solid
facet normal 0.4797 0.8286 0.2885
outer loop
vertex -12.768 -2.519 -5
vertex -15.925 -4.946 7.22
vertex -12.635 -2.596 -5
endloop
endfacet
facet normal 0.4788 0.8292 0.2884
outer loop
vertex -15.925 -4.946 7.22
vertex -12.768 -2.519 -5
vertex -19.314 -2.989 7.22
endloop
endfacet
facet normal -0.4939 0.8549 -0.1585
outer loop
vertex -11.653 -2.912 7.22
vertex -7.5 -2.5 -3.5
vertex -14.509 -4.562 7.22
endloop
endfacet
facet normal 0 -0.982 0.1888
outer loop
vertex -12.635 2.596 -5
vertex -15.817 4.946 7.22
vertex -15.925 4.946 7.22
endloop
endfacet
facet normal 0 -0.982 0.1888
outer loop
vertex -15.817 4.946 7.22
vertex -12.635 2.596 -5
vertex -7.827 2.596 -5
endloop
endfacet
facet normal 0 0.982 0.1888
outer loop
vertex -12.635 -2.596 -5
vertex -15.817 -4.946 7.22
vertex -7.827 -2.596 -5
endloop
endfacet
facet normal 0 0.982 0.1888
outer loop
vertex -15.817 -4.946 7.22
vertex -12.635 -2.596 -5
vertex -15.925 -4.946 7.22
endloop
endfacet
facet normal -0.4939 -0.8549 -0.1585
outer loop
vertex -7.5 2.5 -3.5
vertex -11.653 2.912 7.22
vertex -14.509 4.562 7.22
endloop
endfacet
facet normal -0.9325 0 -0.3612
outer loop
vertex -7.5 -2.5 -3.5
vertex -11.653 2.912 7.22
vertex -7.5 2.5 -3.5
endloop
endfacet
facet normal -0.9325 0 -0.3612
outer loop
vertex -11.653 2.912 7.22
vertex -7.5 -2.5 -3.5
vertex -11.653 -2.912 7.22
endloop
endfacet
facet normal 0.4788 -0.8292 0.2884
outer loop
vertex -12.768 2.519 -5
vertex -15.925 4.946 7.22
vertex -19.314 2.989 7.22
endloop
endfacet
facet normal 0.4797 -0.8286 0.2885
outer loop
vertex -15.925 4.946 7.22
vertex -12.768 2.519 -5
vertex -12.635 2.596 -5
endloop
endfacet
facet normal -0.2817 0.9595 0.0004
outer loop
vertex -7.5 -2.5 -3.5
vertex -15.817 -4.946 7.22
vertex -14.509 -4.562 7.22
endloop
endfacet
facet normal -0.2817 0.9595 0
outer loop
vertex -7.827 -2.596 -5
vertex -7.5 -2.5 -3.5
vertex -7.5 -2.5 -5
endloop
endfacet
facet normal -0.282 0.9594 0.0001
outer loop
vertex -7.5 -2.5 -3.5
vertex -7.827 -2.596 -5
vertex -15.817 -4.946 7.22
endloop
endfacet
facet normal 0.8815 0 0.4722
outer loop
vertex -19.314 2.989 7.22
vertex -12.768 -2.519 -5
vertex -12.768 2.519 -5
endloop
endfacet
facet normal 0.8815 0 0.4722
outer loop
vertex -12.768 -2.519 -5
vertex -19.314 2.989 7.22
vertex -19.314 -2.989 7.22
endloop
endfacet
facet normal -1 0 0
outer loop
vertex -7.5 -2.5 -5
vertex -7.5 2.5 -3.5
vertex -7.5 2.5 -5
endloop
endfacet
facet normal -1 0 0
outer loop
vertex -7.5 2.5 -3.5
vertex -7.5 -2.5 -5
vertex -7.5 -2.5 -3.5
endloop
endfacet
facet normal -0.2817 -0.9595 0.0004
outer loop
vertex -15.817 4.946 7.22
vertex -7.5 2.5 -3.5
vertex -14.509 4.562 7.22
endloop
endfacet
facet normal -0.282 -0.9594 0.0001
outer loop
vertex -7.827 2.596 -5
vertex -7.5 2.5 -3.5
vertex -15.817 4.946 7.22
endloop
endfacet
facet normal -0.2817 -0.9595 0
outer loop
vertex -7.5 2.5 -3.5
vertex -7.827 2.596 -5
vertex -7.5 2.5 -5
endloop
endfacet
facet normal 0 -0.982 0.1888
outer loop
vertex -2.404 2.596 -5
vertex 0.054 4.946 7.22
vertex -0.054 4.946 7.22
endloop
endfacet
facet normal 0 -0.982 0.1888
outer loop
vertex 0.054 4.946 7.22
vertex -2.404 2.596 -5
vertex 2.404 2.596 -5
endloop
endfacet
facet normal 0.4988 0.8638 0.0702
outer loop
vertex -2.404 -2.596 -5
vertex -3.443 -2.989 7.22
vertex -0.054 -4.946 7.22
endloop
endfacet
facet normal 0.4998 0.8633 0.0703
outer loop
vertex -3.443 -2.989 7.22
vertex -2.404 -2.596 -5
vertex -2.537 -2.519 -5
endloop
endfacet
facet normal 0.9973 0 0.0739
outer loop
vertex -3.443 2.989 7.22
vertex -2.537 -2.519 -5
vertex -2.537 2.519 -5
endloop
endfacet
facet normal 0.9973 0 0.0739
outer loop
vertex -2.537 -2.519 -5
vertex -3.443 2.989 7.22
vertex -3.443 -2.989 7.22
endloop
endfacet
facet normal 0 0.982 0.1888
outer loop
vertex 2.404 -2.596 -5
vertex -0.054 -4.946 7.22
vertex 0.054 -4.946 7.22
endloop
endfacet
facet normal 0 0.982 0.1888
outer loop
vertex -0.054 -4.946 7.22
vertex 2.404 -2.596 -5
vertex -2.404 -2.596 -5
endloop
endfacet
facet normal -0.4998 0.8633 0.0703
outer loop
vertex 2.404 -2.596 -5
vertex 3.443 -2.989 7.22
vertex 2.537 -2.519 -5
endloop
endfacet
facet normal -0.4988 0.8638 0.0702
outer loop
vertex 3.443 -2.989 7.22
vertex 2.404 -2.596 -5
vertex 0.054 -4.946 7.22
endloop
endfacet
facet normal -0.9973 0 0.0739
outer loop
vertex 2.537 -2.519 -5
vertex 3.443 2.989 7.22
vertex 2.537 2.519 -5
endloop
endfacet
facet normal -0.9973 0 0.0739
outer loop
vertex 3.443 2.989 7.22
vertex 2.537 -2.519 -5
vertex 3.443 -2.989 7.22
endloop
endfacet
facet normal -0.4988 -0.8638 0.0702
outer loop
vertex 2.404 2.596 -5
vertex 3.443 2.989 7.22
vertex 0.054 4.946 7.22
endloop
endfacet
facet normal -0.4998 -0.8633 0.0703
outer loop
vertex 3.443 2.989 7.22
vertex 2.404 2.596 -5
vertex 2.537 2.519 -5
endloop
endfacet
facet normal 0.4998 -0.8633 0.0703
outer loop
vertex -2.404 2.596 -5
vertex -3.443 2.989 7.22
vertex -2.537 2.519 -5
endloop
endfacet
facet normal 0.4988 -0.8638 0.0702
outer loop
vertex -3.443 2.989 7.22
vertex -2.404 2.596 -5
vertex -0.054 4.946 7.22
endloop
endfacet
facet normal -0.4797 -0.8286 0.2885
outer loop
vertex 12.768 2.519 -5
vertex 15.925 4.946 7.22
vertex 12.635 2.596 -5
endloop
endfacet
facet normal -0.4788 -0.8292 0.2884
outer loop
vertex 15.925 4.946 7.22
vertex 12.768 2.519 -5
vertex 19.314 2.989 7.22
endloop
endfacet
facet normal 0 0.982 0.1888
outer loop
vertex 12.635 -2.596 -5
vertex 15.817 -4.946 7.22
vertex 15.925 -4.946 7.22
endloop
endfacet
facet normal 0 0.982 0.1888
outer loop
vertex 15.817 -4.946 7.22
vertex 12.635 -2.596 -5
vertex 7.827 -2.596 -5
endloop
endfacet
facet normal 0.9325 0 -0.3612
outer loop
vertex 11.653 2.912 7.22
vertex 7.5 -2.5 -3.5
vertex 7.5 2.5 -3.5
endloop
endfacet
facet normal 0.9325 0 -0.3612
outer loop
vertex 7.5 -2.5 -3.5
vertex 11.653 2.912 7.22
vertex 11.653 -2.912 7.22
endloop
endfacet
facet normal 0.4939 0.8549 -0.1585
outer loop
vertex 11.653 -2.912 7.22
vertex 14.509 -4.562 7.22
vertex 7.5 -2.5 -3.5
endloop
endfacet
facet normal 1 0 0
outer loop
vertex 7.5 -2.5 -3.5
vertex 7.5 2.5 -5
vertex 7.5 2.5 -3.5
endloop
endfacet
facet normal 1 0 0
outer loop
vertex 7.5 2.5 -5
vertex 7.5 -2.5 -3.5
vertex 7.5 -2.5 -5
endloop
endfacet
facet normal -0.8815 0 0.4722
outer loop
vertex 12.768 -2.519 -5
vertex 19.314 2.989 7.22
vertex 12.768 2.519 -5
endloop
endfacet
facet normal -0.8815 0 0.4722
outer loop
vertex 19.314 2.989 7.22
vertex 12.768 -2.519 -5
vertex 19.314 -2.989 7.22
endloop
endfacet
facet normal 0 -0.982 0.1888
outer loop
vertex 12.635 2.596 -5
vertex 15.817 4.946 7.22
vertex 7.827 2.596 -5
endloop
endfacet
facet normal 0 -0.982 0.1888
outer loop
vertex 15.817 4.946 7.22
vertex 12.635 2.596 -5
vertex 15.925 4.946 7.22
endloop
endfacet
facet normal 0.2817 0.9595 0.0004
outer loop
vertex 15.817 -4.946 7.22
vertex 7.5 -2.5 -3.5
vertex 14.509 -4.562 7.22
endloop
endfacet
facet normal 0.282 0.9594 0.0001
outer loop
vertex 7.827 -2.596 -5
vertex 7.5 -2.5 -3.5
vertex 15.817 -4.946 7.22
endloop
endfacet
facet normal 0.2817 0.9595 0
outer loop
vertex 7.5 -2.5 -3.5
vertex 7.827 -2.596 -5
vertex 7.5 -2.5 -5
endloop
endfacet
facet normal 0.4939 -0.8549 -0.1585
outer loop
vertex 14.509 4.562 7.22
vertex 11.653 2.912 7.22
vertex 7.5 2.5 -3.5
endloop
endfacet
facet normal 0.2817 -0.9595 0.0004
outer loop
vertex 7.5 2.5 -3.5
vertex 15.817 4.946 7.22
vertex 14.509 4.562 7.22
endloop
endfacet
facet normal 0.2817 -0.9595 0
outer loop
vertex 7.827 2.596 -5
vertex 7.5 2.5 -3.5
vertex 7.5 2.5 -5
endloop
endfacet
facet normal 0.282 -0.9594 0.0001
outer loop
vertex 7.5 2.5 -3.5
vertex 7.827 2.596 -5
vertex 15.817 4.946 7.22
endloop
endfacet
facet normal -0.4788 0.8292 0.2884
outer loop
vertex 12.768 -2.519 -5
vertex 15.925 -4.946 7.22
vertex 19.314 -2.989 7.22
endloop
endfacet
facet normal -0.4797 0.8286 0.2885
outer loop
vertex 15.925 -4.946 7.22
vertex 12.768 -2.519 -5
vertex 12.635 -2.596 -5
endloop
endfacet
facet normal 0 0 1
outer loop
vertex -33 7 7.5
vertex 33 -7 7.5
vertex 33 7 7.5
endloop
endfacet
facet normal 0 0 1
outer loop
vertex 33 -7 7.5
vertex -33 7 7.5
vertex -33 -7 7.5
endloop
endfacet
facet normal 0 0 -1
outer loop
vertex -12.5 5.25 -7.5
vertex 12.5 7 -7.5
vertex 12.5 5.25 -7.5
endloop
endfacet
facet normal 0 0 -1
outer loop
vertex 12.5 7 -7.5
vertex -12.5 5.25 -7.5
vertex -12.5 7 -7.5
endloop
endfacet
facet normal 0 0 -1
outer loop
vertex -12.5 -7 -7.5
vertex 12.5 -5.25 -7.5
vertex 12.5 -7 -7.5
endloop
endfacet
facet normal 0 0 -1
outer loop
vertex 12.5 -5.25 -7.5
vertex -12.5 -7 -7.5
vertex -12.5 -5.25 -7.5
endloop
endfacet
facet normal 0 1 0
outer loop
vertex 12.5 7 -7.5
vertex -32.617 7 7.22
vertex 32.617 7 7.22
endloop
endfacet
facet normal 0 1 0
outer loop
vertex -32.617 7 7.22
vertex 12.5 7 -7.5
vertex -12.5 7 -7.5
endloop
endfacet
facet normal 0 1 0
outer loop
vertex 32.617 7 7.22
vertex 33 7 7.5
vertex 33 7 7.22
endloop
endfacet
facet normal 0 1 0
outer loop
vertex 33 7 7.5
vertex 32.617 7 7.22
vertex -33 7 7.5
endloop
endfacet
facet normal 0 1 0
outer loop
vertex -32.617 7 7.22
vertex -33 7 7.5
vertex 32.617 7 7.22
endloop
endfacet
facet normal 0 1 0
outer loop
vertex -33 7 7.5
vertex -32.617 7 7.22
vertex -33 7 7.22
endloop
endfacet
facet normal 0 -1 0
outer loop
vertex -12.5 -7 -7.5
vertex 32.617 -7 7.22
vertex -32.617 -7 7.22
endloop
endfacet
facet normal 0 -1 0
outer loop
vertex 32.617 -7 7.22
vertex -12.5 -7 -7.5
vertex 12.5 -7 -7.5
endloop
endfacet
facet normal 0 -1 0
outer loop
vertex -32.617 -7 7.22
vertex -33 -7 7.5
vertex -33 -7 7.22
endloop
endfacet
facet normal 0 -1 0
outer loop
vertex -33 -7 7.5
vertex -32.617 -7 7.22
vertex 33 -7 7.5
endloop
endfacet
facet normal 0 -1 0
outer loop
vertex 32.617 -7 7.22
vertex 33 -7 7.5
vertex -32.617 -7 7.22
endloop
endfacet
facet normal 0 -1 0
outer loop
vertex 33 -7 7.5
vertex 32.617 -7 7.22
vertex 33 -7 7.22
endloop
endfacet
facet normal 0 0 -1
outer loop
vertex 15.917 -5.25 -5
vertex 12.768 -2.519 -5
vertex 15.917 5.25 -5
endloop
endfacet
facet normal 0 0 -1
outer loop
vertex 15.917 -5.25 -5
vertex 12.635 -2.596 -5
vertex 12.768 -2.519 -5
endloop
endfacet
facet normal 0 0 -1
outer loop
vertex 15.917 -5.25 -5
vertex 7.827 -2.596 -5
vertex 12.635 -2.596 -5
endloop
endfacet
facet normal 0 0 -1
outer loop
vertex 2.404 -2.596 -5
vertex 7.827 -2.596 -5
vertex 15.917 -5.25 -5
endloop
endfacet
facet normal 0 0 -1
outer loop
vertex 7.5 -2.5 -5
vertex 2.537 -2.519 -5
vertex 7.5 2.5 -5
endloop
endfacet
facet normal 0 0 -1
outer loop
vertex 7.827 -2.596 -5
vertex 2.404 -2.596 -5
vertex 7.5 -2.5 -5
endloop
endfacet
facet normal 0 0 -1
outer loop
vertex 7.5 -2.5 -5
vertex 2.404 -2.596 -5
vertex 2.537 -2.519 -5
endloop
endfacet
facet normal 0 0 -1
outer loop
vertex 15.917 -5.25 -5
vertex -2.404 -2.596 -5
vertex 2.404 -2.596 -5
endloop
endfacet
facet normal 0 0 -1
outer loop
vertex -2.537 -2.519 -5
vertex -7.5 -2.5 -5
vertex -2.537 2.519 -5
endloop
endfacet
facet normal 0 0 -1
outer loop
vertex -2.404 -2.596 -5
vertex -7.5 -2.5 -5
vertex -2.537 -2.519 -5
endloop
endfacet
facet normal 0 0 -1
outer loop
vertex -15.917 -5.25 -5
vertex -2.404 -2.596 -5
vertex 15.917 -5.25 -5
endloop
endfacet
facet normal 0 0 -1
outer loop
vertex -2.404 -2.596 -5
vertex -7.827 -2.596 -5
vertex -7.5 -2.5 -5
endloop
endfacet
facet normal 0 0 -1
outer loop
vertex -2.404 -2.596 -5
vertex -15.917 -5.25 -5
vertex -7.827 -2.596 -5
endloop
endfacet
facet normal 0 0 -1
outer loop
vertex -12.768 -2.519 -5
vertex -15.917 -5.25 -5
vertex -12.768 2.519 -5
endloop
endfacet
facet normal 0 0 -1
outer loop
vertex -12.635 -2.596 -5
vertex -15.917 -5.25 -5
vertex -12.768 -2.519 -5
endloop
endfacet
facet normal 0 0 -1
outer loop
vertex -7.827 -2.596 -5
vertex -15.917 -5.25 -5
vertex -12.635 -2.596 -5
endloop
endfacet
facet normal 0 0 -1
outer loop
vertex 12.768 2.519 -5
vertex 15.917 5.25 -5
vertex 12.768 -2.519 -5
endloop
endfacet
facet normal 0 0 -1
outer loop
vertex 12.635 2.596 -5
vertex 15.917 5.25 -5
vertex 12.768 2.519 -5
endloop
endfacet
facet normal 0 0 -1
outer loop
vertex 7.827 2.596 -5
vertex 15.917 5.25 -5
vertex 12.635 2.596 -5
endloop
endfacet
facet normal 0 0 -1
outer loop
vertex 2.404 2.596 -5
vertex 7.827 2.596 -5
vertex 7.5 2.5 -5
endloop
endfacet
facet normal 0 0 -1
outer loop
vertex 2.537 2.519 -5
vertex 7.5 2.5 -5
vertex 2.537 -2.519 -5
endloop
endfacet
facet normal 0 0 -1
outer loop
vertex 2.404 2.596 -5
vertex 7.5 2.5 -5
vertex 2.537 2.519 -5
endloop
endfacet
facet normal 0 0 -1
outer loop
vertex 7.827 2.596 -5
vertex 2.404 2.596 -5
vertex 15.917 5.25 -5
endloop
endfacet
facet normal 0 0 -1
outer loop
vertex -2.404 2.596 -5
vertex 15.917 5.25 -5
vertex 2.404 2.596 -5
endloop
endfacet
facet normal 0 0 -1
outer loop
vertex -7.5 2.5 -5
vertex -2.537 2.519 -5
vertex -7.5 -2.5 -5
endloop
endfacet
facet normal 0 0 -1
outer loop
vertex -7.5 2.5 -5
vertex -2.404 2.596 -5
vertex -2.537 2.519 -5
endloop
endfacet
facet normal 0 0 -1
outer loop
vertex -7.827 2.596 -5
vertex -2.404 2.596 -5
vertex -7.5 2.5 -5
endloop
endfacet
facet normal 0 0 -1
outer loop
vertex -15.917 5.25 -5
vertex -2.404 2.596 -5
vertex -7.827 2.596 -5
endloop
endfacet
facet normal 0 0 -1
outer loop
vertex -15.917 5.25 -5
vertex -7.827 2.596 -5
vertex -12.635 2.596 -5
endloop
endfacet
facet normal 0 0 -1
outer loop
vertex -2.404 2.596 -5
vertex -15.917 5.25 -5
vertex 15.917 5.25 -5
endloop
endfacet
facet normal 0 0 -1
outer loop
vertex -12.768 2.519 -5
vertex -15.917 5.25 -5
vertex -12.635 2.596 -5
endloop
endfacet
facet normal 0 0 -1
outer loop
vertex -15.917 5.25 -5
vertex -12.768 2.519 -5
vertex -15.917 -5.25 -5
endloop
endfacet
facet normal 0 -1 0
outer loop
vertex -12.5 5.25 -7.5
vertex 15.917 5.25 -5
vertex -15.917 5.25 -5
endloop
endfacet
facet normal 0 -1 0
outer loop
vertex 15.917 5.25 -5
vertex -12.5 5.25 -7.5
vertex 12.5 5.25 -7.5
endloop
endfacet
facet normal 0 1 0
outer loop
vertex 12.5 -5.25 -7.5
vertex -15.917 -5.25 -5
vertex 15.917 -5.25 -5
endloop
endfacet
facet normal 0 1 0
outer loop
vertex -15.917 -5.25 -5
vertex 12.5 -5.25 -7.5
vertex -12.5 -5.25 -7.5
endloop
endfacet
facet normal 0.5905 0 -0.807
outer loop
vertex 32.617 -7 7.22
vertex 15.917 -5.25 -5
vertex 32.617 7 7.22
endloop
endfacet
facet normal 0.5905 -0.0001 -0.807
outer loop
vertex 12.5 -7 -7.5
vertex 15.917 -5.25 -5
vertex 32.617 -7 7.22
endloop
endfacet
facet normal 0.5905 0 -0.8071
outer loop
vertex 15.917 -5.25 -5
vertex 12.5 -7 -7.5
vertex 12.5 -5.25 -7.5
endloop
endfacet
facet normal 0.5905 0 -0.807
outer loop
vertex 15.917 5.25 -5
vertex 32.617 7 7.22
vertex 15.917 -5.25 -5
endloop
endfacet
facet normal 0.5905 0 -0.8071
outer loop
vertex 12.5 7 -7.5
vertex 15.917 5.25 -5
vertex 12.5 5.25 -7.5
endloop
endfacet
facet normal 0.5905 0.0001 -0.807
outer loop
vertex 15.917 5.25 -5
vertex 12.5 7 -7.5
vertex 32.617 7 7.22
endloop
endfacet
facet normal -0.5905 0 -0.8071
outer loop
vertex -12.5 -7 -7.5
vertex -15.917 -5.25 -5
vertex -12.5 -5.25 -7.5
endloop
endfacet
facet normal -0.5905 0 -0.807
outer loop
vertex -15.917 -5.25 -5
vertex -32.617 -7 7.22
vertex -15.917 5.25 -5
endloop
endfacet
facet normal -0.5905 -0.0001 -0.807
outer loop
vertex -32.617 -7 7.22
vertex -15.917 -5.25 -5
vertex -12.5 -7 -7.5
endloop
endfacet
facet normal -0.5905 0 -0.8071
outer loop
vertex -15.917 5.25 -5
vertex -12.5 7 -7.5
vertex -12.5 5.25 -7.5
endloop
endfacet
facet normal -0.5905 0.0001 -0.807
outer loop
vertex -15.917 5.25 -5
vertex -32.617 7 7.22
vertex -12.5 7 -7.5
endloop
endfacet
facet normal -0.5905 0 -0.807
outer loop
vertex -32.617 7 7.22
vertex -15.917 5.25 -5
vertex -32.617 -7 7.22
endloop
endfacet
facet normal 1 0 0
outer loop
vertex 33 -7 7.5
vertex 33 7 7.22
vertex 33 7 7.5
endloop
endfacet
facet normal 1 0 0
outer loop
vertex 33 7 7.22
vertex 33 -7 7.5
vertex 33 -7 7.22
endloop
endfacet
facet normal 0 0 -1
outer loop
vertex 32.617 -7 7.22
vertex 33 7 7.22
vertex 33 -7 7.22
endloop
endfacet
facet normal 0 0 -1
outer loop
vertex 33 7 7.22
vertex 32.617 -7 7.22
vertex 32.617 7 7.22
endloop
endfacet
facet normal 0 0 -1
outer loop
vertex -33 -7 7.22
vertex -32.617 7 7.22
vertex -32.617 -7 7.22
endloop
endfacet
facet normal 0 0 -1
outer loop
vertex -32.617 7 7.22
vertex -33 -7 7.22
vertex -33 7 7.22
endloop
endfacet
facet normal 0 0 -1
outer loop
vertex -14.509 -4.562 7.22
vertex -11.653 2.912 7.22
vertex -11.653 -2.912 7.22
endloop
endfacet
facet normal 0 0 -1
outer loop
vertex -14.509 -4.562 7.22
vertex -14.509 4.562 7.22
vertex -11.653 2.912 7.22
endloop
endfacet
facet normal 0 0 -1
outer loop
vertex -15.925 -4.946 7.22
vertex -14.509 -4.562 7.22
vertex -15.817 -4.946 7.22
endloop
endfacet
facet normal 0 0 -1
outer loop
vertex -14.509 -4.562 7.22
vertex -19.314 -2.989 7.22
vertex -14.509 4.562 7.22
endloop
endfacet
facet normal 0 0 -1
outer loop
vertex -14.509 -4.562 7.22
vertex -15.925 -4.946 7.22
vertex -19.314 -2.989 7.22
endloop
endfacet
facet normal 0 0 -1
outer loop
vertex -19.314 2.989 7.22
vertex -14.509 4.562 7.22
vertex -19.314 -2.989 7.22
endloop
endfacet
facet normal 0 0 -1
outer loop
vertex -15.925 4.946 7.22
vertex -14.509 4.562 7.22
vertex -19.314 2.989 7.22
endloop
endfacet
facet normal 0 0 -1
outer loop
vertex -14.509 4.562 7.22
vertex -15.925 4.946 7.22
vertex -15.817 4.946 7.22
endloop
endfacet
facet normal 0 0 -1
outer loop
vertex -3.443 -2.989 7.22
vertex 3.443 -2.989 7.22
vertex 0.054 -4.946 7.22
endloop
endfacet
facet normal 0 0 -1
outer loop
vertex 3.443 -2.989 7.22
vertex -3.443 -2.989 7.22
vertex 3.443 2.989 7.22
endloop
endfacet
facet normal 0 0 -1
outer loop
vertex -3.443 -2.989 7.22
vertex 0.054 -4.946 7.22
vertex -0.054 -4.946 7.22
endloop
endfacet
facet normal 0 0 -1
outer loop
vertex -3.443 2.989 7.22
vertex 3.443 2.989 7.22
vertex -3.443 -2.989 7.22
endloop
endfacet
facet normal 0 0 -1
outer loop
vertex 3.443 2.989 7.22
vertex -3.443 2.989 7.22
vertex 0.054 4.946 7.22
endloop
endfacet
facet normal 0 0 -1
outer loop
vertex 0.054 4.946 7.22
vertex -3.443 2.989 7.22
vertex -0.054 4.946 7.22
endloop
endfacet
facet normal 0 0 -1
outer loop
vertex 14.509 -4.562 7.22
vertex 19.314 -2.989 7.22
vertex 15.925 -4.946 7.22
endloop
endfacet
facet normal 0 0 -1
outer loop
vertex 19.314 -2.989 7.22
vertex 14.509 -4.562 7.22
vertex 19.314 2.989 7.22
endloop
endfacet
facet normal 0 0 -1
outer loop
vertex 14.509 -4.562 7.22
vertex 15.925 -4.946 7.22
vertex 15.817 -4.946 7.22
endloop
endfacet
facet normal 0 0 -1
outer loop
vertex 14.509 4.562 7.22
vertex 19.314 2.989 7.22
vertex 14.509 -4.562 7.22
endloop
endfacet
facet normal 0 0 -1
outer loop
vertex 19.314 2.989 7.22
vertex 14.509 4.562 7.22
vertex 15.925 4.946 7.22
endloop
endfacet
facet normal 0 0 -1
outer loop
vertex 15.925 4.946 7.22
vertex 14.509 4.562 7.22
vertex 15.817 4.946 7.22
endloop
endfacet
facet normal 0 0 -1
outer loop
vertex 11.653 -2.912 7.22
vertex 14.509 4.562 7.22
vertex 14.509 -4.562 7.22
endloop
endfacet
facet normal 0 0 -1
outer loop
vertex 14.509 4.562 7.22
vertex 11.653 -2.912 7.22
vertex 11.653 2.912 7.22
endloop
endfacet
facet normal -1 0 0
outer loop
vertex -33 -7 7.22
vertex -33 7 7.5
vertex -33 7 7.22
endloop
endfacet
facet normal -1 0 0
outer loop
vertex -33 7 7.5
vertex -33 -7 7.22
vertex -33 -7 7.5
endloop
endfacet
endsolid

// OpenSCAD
// WS2812 LED Strip Parameters - verified measurements
led_spacing = 10;      // 10mm between LED centers
strip_width = 10;      // 10mm wide LED strip
strip_height = 2;      // Keep same
tolerance = 0.5;       // Keep same
led_size = 5;         // 5mm square LED cutouts

// Updated Base Parameters
base_width = 66;      // Optimized smaller base
base_length = 14;     // Adjusted proportionally
base_height = 15;     // Increased by 25% from 25mm
base_space = 4;
// Updated 7-Segment Display Parameters
segment_h_length = 6;    // Increased horizontal length for wider number
segment_width = 8;        // Keep wider segments

// Add diffuser parameters
diffuser_height = .28;

// Define LED positions globally

led1 = [0,1.0 * led_spacing];   // LED4 - Center LED
led2 = [0,0.0 * led_spacing];   // LED4 - Center LED
led3 = [0,-1.0 * led_spacing];   // LED5


// Define segment positions globally - Wide and squished

seg_a = [0, 16];      // A (top horizontal) - same height
seg_b = [0, 0];       // G (middle horizontal) - unchanged
seg_c = [0, -16];     // D (bottom horizontal) - moved closer

// LED Strip Channel with wire channels - centered
module led_channel() {
    // Main channel exactly 10mm wide plus tolerance
    translate([-base_width/2 , -strip_width/2 - tolerance/2, -base_height/2])
        cube([base_width, strip_width + tolerance, strip_height + tolerance]);
}

// Single light pipe cavity with elongating shape
module light_cavity(led_pos, segment_pos, is_horizontal=false) {
    // Calculate heights for better progression
    z_bottom = -base_height/2 + strip_height;
    z_top = base_height/2;
    total_height = z_top - z_bottom;
    
    hull() {
        // Bottom (at LED) - small square
        translate([led_pos[0] - led_size/2, led_pos[1] - led_size/2, z_bottom])
            cube([led_size, led_size, 2]);
     
            
        // Top (at segment) - full segment shape
        translate([segment_pos[0], segment_pos[1], z_top ]) {
            rotate([0, 0, is_horizontal ? 0 : 90])
                linear_extrude(height=2)
                    segment(segment_h_length, segment_width);
        }
    }
    
}

// All light cavities with corrected segment positions and mirroring
module all_cavities(visualization=false) {
    
    rotate([0, 0, 90]) {
        // Light paths
        light_cavity(led1, seg_a, true);   // LED1 → F (vertical)
        light_cavity(led2, seg_b, true);   // LED2 → E (vertical)
        light_cavity(led3, seg_c, true);    // LED3 → A (horizontal)

    }
}

// Base with LED channel, cavities, 
module base() {
    difference() {
        // Main block
        cube([base_width, base_length, base_height], center=true);             
        // LED channel
        led_channel();
        // Light pipe cavities
        all_cavities(false);  // Use same paths for actual cavities
    }
}

module segment(length, width) {
    // Elongated hexagonal shape
    hull() {
        translate([-length/2 + width/2, 0, 0]) 
            circle(d=width, $fn=6);
        translate([length/2 - width/2, 0, 0])  
            circle(d=width, $fn=6);
    }
}

// Diffuser layer module
module diffuser_layer() {
    translate([0, 0, (base_height/2) - diffuser_height/2])  // Changed to sit directly on base
        cube([base_width, base_length, diffuser_height], center=true);
}

// // Render just the paths in red with slight transparency
// //all_cavities(true);  // Show paths
// union() {
//    base();
// //    diffuser_layer();
// }
   
module side_cut(side = "left") {
    color("Green", alpha=0.9);
    if (side == "left") {
    rotate([90, 0, 0])
    translate([0, 0, -base_length/2])
        linear_extrude(height=base_length)
            polygon(
            points=[
                [0+base_width/2,0 - base_height/2],
                [0 + led_spacing + led_size/2,0 - base_height/2],
                [0+base_width/2, base_height/2]
                ], 
            paths=[[0,1,2]]
        );
    } else if (side == "right") {
        rotate([90, 0, 0])
        translate([0, 0, -base_length/2])
            linear_extrude(height=base_length)
                polygon(
                points=[
                 [0-base_width/2,0 - base_height/2],
                [0 - led_spacing - led_size/2,0 - base_height/2],
                [0-base_width/2, base_height/2]
                    ], 
                paths=[[0,1,2]]
            );
    }
}





// New module for the intersection shape
module intersection_layer() {
        color("Red", alpha=0.9)  // Semi-transparent to visualize

        intersection() {
            all_cavities(true);
            diffuser_layer();
        };
    } 

// union(){
// Replace the final union() with:
// color("Green", alpha=0.9) {
// side_cut("left");
// side_cut("right");
// }
    union() {
         color("Yellow", alpha=0.9) {

    difference() {
        base();
        side_cut("left");
        side_cut("right");
    }
         }
    color("White", alpha=0.2) {
        diffuser_layer();

    }  
    
 }

// intersection_layer();
// diffuser_layer();
